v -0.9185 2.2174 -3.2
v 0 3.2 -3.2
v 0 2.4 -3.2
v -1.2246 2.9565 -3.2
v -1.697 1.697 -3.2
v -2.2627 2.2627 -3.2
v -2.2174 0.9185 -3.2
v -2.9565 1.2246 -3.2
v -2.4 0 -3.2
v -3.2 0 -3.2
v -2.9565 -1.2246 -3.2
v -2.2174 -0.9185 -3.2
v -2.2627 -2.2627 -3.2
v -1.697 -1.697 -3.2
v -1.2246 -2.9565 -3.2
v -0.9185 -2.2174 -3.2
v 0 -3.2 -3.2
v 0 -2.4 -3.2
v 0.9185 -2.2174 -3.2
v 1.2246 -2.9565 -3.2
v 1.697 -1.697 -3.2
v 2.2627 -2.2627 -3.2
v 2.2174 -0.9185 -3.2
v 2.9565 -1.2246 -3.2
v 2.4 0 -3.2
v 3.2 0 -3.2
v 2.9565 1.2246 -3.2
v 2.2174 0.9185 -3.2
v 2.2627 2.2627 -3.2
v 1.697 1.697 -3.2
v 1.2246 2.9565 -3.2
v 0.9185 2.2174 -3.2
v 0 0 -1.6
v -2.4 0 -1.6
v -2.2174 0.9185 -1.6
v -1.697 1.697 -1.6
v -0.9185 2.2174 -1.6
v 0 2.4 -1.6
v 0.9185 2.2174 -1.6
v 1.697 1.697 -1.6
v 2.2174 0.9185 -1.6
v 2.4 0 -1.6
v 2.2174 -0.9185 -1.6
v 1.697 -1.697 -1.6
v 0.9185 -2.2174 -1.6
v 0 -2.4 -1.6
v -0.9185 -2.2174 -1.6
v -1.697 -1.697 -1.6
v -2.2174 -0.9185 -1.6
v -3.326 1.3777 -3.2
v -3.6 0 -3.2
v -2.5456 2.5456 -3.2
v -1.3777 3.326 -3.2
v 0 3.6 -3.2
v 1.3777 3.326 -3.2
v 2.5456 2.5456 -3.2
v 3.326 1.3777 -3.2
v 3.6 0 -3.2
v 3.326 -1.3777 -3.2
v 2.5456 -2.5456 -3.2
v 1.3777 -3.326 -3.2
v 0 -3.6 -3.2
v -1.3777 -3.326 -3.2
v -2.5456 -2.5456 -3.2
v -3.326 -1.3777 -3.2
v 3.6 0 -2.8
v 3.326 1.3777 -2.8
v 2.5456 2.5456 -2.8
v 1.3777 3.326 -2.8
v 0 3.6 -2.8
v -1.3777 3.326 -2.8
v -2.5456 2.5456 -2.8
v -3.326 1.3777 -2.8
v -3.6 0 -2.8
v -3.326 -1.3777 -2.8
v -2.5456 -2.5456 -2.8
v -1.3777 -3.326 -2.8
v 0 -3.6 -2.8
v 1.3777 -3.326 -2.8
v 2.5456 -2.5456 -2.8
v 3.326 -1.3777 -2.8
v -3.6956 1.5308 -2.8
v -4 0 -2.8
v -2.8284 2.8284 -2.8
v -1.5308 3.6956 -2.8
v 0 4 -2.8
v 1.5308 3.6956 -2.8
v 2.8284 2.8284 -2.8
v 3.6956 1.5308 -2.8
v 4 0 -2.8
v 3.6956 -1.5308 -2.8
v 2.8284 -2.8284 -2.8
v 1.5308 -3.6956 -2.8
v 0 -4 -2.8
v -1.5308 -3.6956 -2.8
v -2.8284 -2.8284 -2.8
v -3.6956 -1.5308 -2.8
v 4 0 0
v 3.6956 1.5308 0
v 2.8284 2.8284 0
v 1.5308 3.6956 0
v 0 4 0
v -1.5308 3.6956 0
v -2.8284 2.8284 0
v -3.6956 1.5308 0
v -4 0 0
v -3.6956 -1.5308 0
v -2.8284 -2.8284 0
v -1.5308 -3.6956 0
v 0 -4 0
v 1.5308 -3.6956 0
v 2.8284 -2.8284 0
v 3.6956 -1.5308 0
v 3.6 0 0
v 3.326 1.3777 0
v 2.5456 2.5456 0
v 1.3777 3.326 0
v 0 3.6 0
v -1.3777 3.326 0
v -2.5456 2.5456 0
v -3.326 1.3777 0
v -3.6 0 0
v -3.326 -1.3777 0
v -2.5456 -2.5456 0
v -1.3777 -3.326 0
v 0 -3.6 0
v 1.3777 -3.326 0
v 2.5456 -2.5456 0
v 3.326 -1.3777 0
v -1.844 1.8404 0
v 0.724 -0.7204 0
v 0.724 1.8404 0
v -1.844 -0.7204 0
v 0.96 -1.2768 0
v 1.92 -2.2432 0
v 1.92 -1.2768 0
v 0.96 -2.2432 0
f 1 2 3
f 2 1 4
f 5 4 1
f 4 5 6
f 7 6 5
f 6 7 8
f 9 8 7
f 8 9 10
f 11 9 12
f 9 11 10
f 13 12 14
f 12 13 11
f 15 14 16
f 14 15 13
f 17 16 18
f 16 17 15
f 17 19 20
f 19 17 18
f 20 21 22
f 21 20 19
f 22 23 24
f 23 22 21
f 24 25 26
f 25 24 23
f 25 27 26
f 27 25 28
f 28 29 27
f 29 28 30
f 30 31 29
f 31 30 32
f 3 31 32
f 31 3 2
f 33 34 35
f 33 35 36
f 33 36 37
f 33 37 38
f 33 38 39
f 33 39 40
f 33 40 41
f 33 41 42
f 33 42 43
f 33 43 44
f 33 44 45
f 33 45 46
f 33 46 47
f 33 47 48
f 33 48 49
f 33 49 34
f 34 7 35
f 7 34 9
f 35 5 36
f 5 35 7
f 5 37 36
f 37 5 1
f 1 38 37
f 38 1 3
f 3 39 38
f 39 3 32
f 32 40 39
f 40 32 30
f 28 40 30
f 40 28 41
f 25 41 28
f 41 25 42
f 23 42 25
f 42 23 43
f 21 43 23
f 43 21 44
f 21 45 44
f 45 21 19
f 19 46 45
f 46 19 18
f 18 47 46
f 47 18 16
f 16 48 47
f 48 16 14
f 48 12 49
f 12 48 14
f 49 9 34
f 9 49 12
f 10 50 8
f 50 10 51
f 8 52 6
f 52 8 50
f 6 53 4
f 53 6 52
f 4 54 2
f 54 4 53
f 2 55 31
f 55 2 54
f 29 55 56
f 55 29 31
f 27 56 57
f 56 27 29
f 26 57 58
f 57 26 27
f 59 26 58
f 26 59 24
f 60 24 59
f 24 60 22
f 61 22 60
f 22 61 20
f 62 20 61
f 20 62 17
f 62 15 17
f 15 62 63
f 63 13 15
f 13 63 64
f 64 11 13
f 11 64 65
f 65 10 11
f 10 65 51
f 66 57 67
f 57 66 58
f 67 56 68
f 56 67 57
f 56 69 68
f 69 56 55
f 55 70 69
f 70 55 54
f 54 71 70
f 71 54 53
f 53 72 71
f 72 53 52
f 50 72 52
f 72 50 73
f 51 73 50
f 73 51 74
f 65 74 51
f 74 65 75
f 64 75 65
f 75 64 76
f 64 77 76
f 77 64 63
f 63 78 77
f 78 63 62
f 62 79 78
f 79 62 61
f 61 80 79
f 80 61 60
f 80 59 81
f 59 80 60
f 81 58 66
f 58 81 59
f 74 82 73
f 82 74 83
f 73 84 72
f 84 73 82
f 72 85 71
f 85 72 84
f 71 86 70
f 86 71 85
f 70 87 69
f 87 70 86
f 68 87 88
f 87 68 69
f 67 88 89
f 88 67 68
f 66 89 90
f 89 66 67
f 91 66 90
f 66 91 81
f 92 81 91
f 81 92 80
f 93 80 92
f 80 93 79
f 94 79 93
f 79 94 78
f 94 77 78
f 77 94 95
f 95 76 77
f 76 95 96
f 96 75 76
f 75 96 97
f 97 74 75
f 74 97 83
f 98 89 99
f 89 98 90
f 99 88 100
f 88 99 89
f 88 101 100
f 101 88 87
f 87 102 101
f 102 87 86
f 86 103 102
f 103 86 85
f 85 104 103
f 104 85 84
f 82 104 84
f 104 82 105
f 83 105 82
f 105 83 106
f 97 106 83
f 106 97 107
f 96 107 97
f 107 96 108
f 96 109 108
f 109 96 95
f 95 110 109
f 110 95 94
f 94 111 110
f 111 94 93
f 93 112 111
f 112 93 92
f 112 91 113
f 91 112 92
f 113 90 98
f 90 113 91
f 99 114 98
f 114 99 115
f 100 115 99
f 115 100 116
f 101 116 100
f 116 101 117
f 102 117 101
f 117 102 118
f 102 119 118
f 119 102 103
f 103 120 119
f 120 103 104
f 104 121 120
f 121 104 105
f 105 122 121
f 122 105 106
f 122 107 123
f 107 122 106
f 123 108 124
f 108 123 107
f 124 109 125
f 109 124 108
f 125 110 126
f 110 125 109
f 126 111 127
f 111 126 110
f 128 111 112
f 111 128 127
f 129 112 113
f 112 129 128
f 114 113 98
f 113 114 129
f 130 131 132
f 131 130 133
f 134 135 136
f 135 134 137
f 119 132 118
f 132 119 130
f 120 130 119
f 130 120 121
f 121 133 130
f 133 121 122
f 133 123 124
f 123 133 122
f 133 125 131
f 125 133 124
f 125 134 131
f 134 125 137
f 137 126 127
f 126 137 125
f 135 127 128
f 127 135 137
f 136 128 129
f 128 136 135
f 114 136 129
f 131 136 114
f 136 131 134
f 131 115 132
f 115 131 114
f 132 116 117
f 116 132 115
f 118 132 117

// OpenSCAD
// file: ../p/4-4disc.scad
use <../lib.scad>
function ldraw_lib__4_4disc() = [
// 0 Disc 1.0
// 0 Name: 4-4disc.dat
// 0 Author: James Jessiman
// 0 !LDRAW_ORG Primitive UPDATE 2002-02
// 0 !LICENSE Licensed under CC BY 2.0 and CC BY 4.0 : see CAreadme.txt
// 
// 0 BFC CERTIFY CCW
  [0,"BFC","CERTIFY"],
  [0,"BFC","CCW"],
// 
// 0 !HISTORY 1998-12-15 [PTadmin] Official Update 1998-10
// 0 !HISTORY 2002-03-23 [sbliss] Added BFC statement
// 0 !HISTORY 2002-04-25 [PTadmin] Official Update 2002-02
// 0 !HISTORY 2007-06-24 [PTadmin] Header formatted for Contributor Agreement
// 0 !HISTORY 2008-07-01 [PTadmin] Official Update 2008-01
// 
// 
// 3 16 0 0 0 1 0 0 0.9239 0 0.3827
  [3,16,0,0,0,1,0,0,0.9239,0,0.3827],
// 3 16 0 0 0 0.9239 0 0.3827 0.7071 0 0.7071
  [3,16,0,0,0,0.9239,0,0.3827,0.7071,0,0.7071],
// 3 16 0 0 0 0.7071 0 0.7071 0.3827 0 0.9239
  [3,16,0,0,0,0.7071,0,0.7071,0.3827,0,0.9239],
// 3 16 0 0 0 0.3827 0 0.9239 0 0 1
  [3,16,0,0,0,0.3827,0,0.9239,0,0,1],
// 3 16 0 0 0 0 0 1 -0.3827 0 0.9239
  [3,16,0,0,0,0,0,1,-0.3827,0,0.9239],
// 3 16 0 0 0 -0.3827 0 0.9239 -0.7071 0 0.7071
  [3,16,0,0,0,-0.3827,0,0.9239,-0.7071,0,0.7071],
// 3 16 0 0 0 -0.7071 0 0.7071 -0.9239 0 0.3827
  [3,16,0,0,0,-0.7071,0,0.7071,-0.9239,0,0.3827],
// 3 16 0 0 0 -0.9239 0 0.3827 -1 0 -0
  [3,16,0,0,0,-0.9239,0,0.3827,-1,0,-0],
// 3 16 0 0 0 -1 0 -0 -0.9239 0 -0.3827
  [3,16,0,0,0,-1,0,-0,-0.9239,0,-0.3827],
// 3 16 0 0 0 -0.9239 0 -0.3827 -0.7071 0 -0.7071
  [3,16,0,0,0,-0.9239,0,-0.3827,-0.7071,0,-0.7071],
// 3 16 0 0 0 -0.7071 0 -0.7071 -0.3827 0 -0.9239
  [3,16,0,0,0,-0.7071,0,-0.7071,-0.3827,0,-0.9239],
// 3 16 0 0 0 -0.3827 0 -0.9239 0 0 -1
  [3,16,0,0,0,-0.3827,0,-0.9239,0,0,-1],
// 3 16 0 0 0 0 0 -1 0.3827 0 -0.9239
  [3,16,0,0,0,0,0,-1,0.3827,0,-0.9239],
// 3 16 0 0 0 0.3827 0 -0.9239 0.7071 0 -0.7071
  [3,16,0,0,0,0.3827,0,-0.9239,0.7071,0,-0.7071],
// 3 16 0 0 0 0.7071 0 -0.7071 0.9239 0 -0.3827
  [3,16,0,0,0,0.7071,0,-0.7071,0.9239,0,-0.3827],
// 3 16 0 0 0 0.9239 0 -0.3827 1 0 0
  [3,16,0,0,0,0.9239,0,-0.3827,1,0,0],
// 0
];
makepoly(ldraw_lib__4_4disc(), line=0.2);
// file: ../p/4-4ring3.scad
use <../lib.scad>
function ldraw_lib__4_4ring3() = [
// 0 Ring  3 x 1.0
// 0 Name: 4-4ring3.dat
// 0 Author: James Jessiman
// 0 !LDRAW_ORG Primitive UPDATE 2009-01
// 0 !LICENSE Licensed under CC BY 2.0 and CC BY 4.0 : see CAreadme.txt
// 
// 0 BFC CERTIFY CCW
  [0,"BFC","CERTIFY"],
  [0,"BFC","CCW"],
// 
// 0 !HISTORY 1998-12-15 [PTadmin] Official Update 1998-10
// 0 !HISTORY 2002-04-05 [hafhead] Added BFC statement
// 0 !HISTORY 2002-04-25 [PTadmin] Official Update 2002-02
// 0 !HISTORY 2007-06-24 [PTadmin] Header formatted for Contributor Agreement
// 0 !HISTORY 2008-07-01 [PTadmin] Official Update 2008-01
// 0 !HISTORY 2008-08-26 [cwdee] Switch polygon winding and rename
// 0 !HISTORY 2009-05-02 [PTadmin] Official Update 2009-01
// 
// 
// 4 16 -1.5308 0 3.6956 -1.1481 0 2.7717 0 0 3 0 0 4
  [4,16,-1.5308,0,3.6956,-1.1481,0,2.7717,0,0,3,0,0,4],
// 4 16 -2.8284 0 2.8284 -2.1213 0 2.1213 -1.1481 0 2.7717 -1.5308 0 3.6956
  [4,16,-2.8284,0,2.8284,-2.1213,0,2.1213,-1.1481,0,2.7717,-1.5308,0,3.6956],
// 4 16 -3.6956 0 1.5308 -2.7717 0 1.1481 -2.1213 0 2.1213 -2.8284 0 2.8284
  [4,16,-3.6956,0,1.5308,-2.7717,0,1.1481,-2.1213,0,2.1213,-2.8284,0,2.8284],
// 4 16 -4 0 0 -3 0 0 -2.7717 0 1.1481 -3.6956 0 1.5308
  [4,16,-4,0,0,-3,0,0,-2.7717,0,1.1481,-3.6956,0,1.5308],
// 4 16 -3.6956 0 -1.5308 -2.7717 0 -1.1481 -3 0 0 -4 0 0
  [4,16,-3.6956,0,-1.5308,-2.7717,0,-1.1481,-3,0,0,-4,0,0],
// 4 16 -2.8284 0 -2.8284 -2.1213 0 -2.1213 -2.7717 0 -1.1481 -3.6956 0 -1.5308
  [4,16,-2.8284,0,-2.8284,-2.1213,0,-2.1213,-2.7717,0,-1.1481,-3.6956,0,-1.5308],
// 4 16 -1.5308 0 -3.6956 -1.1481 0 -2.7717 -2.1213 0 -2.1213 -2.8284 0 -2.8284
  [4,16,-1.5308,0,-3.6956,-1.1481,0,-2.7717,-2.1213,0,-2.1213,-2.8284,0,-2.8284],
// 4 16 0 0 -4 0 0 -3 -1.1481 0 -2.7717 -1.5308 0 -3.6956
  [4,16,0,0,-4,0,0,-3,-1.1481,0,-2.7717,-1.5308,0,-3.6956],
// 4 16 1.5308 0 -3.6956 1.1481 0 -2.7717 0 0 -3 0 0 -4
  [4,16,1.5308,0,-3.6956,1.1481,0,-2.7717,0,0,-3,0,0,-4],
// 4 16 2.8284 0 -2.8284 2.1213 0 -2.1213 1.1481 0 -2.7717 1.5308 0 -3.6956
  [4,16,2.8284,0,-2.8284,2.1213,0,-2.1213,1.1481,0,-2.7717,1.5308,0,-3.6956],
// 4 16 3.6956 0 -1.5308 2.7717 0 -1.1481 2.1213 0 -2.1213 2.8284 0 -2.8284
  [4,16,3.6956,0,-1.5308,2.7717,0,-1.1481,2.1213,0,-2.1213,2.8284,0,-2.8284],
// 4 16 4 0 0 3 0 0 2.7717 0 -1.1481 3.6956 0 -1.5308
  [4,16,4,0,0,3,0,0,2.7717,0,-1.1481,3.6956,0,-1.5308],
// 4 16 3.6956 0 1.5308 2.7717 0 1.1481 3 0 0 4 0 0
  [4,16,3.6956,0,1.5308,2.7717,0,1.1481,3,0,0,4,0,0],
// 4 16 2.8284 0 2.8284 2.1213 0 2.1213 2.7717 0 1.1481 3.6956 0 1.5308
  [4,16,2.8284,0,2.8284,2.1213,0,2.1213,2.7717,0,1.1481,3.6956,0,1.5308],
// 4 16 1.5308 0 3.6956 1.1481 0 2.7717 2.1213 0 2.1213 2.8284 0 2.8284
  [4,16,1.5308,0,3.6956,1.1481,0,2.7717,2.1213,0,2.1213,2.8284,0,2.8284],
// 4 16 0 0 4 0 0 3 1.1481 0 2.7717 1.5308 0 3.6956
  [4,16,0,0,4,0,0,3,1.1481,0,2.7717,1.5308,0,3.6956],
// 0
];
makepoly(ldraw_lib__4_4ring3(), line=0.2);
// file: ../p/4-4cylc.scad
use <../lib.scad>
use <4-4cyli.scad>
use <4-4disc.scad>
use <4-4edge.scad>
function ldraw_lib__4_4cylc() = [
// 0 Cylinder Closed 1.0
// 0 Name: 4-4cylc.dat
// 0 Author: Alex Taylor [anathema]
// 0 !LDRAW_ORG Primitive UPDATE 2009-02
// 0 !LICENSE Licensed under CC BY 2.0 and CC BY 4.0 : see CAreadme.txt
// 
// 0 BFC CERTIFY CCW
  [0,"BFC","CERTIFY"],
  [0,"BFC","CCW"],
// 
// 0 !HISTORY 2008-12-29 [cwdee] Removed one disc
// 0 !HISTORY 2009-09-03 [PTadmin] Official Update 2009-02
// 
// 
// 1 16 0 0 0 1 0 0 0 1 0 0 0 1 4-4edge.dat
  [1,16,0,0,0,1,0,0,0,1,0,0,0,1, ldraw_lib__4_4edge()],
// 1 16 0 1 0 1 0 0 0 1 0 0 0 1 4-4edge.dat
  [1,16,0,1,0,1,0,0,0,1,0,0,0,1, ldraw_lib__4_4edge()],
// 1 16 0 0 0 1 0 0 0 1 0 0 0 1 4-4disc.dat
  [1,16,0,0,0,1,0,0,0,1,0,0,0,1, ldraw_lib__4_4disc()],
// 1 16 0 0 0 1 0 0 0 1 0 0 0 1 4-4cyli.dat
  [1,16,0,0,0,1,0,0,0,1,0,0,0,1, ldraw_lib__4_4cyli()],
// 0
];
makepoly(ldraw_lib__4_4cylc(), line=0.2);
// file: ../p/4-4edge.scad
use <../lib.scad>
function ldraw_lib__4_4edge() = [
// 0 Circle 1.0
// 0 Name: 4-4edge.dat
// 0 Author: James Jessiman
// 0 !LDRAW_ORG Primitive UPDATE 2017-01
// 0 !LICENSE Licensed under CC BY 2.0 and CC BY 4.0 : see CAreadme.txt
// 
// 0 BFC CERTIFY CCW
  [0,"BFC","CERTIFY"],
  [0,"BFC","CCW"],
// 
// 0 !HISTORY 1998-12-15 [PTadmin] Official Update 1998-10
// 0 !HISTORY 2005-12-28 [PTadmin] Official Update 2005-01
// 0 !HISTORY 2007-06-24 [PTadmin] Header formatted for Contributor Agreement
// 0 !HISTORY 2008-07-01 [PTadmin] Official Update 2008-01
// 0 !HISTORY 2017-01-15 [Steffen] BFCed
// 0 !HISTORY 2017-12-30 [PTadmin] Official Update 2017-01
// 
// 
// 2 24 1 0 0 0.9239 0 0.3827
  [2,24,1,0,0,0.9239,0,0.3827],
// 2 24 0.9239 0 0.3827 0.7071 0 0.7071
  [2,24,0.9239,0,0.3827,0.7071,0,0.7071],
// 2 24 0.7071 0 0.7071 0.3827 0 0.9239
  [2,24,0.7071,0,0.7071,0.3827,0,0.9239],
// 2 24 0.3827 0 0.9239 0 0 1
  [2,24,0.3827,0,0.9239,0,0,1],
// 2 24 0 0 1 -0.3827 0 0.9239
  [2,24,0,0,1,-0.3827,0,0.9239],
// 2 24 -0.3827 0 0.9239 -0.7071 0 0.7071
  [2,24,-0.3827,0,0.9239,-0.7071,0,0.7071],
// 2 24 -0.7071 0 0.7071 -0.9239 0 0.3827
  [2,24,-0.7071,0,0.7071,-0.9239,0,0.3827],
// 2 24 -0.9239 0 0.3827 -1 0 -0
  [2,24,-0.9239,0,0.3827,-1,0,-0],
// 2 24 -1 0 -0 -0.9239 0 -0.3827
  [2,24,-1,0,-0,-0.9239,0,-0.3827],
// 2 24 -0.9239 0 -0.3827 -0.7071 0 -0.7071
  [2,24,-0.9239,0,-0.3827,-0.7071,0,-0.7071],
// 2 24 -0.7071 0 -0.7071 -0.3827 0 -0.9239
  [2,24,-0.7071,0,-0.7071,-0.3827,0,-0.9239],
// 2 24 -0.3827 0 -0.9239 0 0 -1
  [2,24,-0.3827,0,-0.9239,0,0,-1],
// 2 24 0 0 -1 0.3827 0 -0.9239
  [2,24,0,0,-1,0.3827,0,-0.9239],
// 2 24 0.3827 0 -0.9239 0.7071 0 -0.7071
  [2,24,0.3827,0,-0.9239,0.7071,0,-0.7071],
// 2 24 0.7071 0 -0.7071 0.9239 0 -0.3827
  [2,24,0.7071,0,-0.7071,0.9239,0,-0.3827],
// 2 24 0.9239 0 -0.3827 1 0 0
  [2,24,0.9239,0,-0.3827,1,0,0],
];
makepoly(ldraw_lib__4_4edge(), line=0.2);
// file: ../p/4-4cyli.scad
use <../lib.scad>
function ldraw_lib__4_4cyli() = [
// 0 Cylinder 1.0
// 0 Name: 4-4cyli.dat
// 0 Author: James Jessiman
// 0 !LDRAW_ORG Primitive UPDATE 2005-01
// 0 !LICENSE Licensed under CC BY 2.0 and CC BY 4.0 : see CAreadme.txt
// 
// 0 BFC CERTIFY CCW
  [0,"BFC","CERTIFY"],
  [0,"BFC","CCW"],
// 
// 0 !HISTORY 1998-12-15 [PTadmin] Official Update 1998-10
// 0 !HISTORY 2002-03-23 [sbliss] Added BFC statement; merged headers from files in distributions LDraw 0.27 and Complete.
// 0 !HISTORY 2002-04-25 [PTadmin] Official Update 2002-02
// 0 !HISTORY 2004-12-14 [guyvivan] BFC CCW
// 0 !HISTORY 2005-12-28 [PTadmin] Official Update 2005-01
// 0 !HISTORY 2007-06-24 [PTadmin] Header formatted for Contributor Agreement
// 0 !HISTORY 2008-07-01 [PTadmin] Official Update 2008-01
// 
// 
// 4 16 1 1 0 0.9239 1 0.3827 0.9239 0 0.3827 1 0 0
  [4,16,1,1,0,0.9239,1,0.3827,0.9239,0,0.3827,1,0,0],
// 5 24 1 0 0 1 1 0 0.9239 0 0.3827 0.9239 0 -0.3827
  [5,24,1,0,0,1,1,0,0.9239,0,0.3827,0.9239,0,-0.3827],
// 4 16 0.9239 1 0.3827 0.7071 1 0.7071 0.7071 0 0.7071 0.9239 0 0.3827
  [4,16,0.9239,1,0.3827,0.7071,1,0.7071,0.7071,0,0.7071,0.9239,0,0.3827],
// 5 24 0.9239 0 0.3827 0.9239 1 0.3827 0.7071 0 0.7071 1 0 0
  [5,24,0.9239,0,0.3827,0.9239,1,0.3827,0.7071,0,0.7071,1,0,0],
// 4 16 0.7071 1 0.7071 0.3827 1 0.9239 0.3827 0 0.9239 0.7071 0 0.7071
  [4,16,0.7071,1,0.7071,0.3827,1,0.9239,0.3827,0,0.9239,0.7071,0,0.7071],
// 5 24 0.7071 0 0.7071 0.7071 1 0.7071 0.3827 0 0.9239 0.9239 0 0.3827
  [5,24,0.7071,0,0.7071,0.7071,1,0.7071,0.3827,0,0.9239,0.9239,0,0.3827],
// 4 16 0.3827 1 0.9239 0 1 1 0 0 1 0.3827 0 0.9239
  [4,16,0.3827,1,0.9239,0,1,1,0,0,1,0.3827,0,0.9239],
// 5 24 0.3827 0 0.9239 0.3827 1 0.9239 0 0 1 0.7071 0 0.7071
  [5,24,0.3827,0,0.9239,0.3827,1,0.9239,0,0,1,0.7071,0,0.7071],
// 4 16 0 1 1 -0.3827 1 0.9239 -0.3827 0 0.9239 0 0 1
  [4,16,0,1,1,-0.3827,1,0.9239,-0.3827,0,0.9239,0,0,1],
// 5 24 0 0 1 0 1 1 -0.3827 0 0.9239 0.3827 0 0.9239
  [5,24,0,0,1,0,1,1,-0.3827,0,0.9239,0.3827,0,0.9239],
// 4 16 -0.3827 1 0.9239 -0.7071 1 0.7071 -0.7071 0 0.7071 -0.3827 0 0.9239
  [4,16,-0.3827,1,0.9239,-0.7071,1,0.7071,-0.7071,0,0.7071,-0.3827,0,0.9239],
// 5 24 -0.3827 0 0.9239 -0.3827 1 0.9239 -0.7071 0 0.7071 0 0 1
  [5,24,-0.3827,0,0.9239,-0.3827,1,0.9239,-0.7071,0,0.7071,0,0,1],
// 4 16 -0.7071 1 0.7071 -0.9239 1 0.3827 -0.9239 0 0.3827 -0.7071 0 0.7071
  [4,16,-0.7071,1,0.7071,-0.9239,1,0.3827,-0.9239,0,0.3827,-0.7071,0,0.7071],
// 5 24 -0.7071 0 0.7071 -0.7071 1 0.7071 -0.9239 0 0.3827 -0.3827 0 0.9239
  [5,24,-0.7071,0,0.7071,-0.7071,1,0.7071,-0.9239,0,0.3827,-0.3827,0,0.9239],
// 4 16 -0.9239 1 0.3827 -1 1 0 -1 0 0 -0.9239 0 0.3827
  [4,16,-0.9239,1,0.3827,-1,1,0,-1,0,0,-0.9239,0,0.3827],
// 5 24 -0.9239 0 0.3827 -0.9239 1 0.3827 -1 0 0 -0.7071 0 0.7071
  [5,24,-0.9239,0,0.3827,-0.9239,1,0.3827,-1,0,0,-0.7071,0,0.7071],
// 4 16 -1 1 0 -0.9239 1 -0.3827 -0.9239 0 -0.3827 -1 0 0
  [4,16,-1,1,0,-0.9239,1,-0.3827,-0.9239,0,-0.3827,-1,0,0],
// 5 24 -1 0 0 -1 1 0 -0.9239 0 -0.3827 -0.9239 0 0.3827
  [5,24,-1,0,0,-1,1,0,-0.9239,0,-0.3827,-0.9239,0,0.3827],
// 4 16 -0.9239 1 -0.3827 -0.7071 1 -0.7071 -0.7071 0 -0.7071 -0.9239 0 -0.3827
  [4,16,-0.9239,1,-0.3827,-0.7071,1,-0.7071,-0.7071,0,-0.7071,-0.9239,0,-0.3827],
// 5 24 -0.9239 0 -0.3827 -0.9239 1 -0.3827 -0.7071 0 -0.7071 -1 0 0
  [5,24,-0.9239,0,-0.3827,-0.9239,1,-0.3827,-0.7071,0,-0.7071,-1,0,0],
// 4 16 -0.7071 1 -0.7071 -0.3827 1 -0.9239 -0.3827 0 -0.9239 -0.7071 0 -0.7071
  [4,16,-0.7071,1,-0.7071,-0.3827,1,-0.9239,-0.3827,0,-0.9239,-0.7071,0,-0.7071],
// 5 24 -0.7071 0 -0.7071 -0.7071 1 -0.7071 -0.3827 0 -0.9239 -0.9239 0 -0.3827
  [5,24,-0.7071,0,-0.7071,-0.7071,1,-0.7071,-0.3827,0,-0.9239,-0.9239,0,-0.3827],
// 4 16 -0.3827 1 -0.9239 0 1 -1 0 0 -1 -0.3827 0 -0.9239
  [4,16,-0.3827,1,-0.9239,0,1,-1,0,0,-1,-0.3827,0,-0.9239],
// 5 24 -0.3827 0 -0.9239 -0.3827 1 -0.9239 0 0 -1 -0.7071 0 -0.7071
  [5,24,-0.3827,0,-0.9239,-0.3827,1,-0.9239,0,0,-1,-0.7071,0,-0.7071],
// 4 16 0 1 -1 0.3827 1 -0.9239 0.3827 0 -0.9239 0 0 -1
  [4,16,0,1,-1,0.3827,1,-0.9239,0.3827,0,-0.9239,0,0,-1],
// 5 24 0 0 -1 0 1 -1 0.3827 0 -0.9239 -0.3827 0 -0.9239
  [5,24,0,0,-1,0,1,-1,0.3827,0,-0.9239,-0.3827,0,-0.9239],
// 4 16 0.3827 1 -0.9239 0.7071 1 -0.7071 0.7071 0 -0.7071 0.3827 0 -0.9239
  [4,16,0.3827,1,-0.9239,0.7071,1,-0.7071,0.7071,0,-0.7071,0.3827,0,-0.9239],
// 5 24 0.3827 0 -0.9239 0.3827 1 -0.9239 0.7071 0 -0.7071 0 0 -1
  [5,24,0.3827,0,-0.9239,0.3827,1,-0.9239,0.7071,0,-0.7071,0,0,-1],
// 4 16 0.7071 1 -0.7071 0.9239 1 -0.3827 0.9239 0 -0.3827 0.7071 0 -0.7071
  [4,16,0.7071,1,-0.7071,0.9239,1,-0.3827,0.9239,0,-0.3827,0.7071,0,-0.7071],
// 5 24 0.7071 0 -0.7071 0.7071 1 -0.7071 0.9239 0 -0.3827 0.3827 0 -0.9239
  [5,24,0.7071,0,-0.7071,0.7071,1,-0.7071,0.9239,0,-0.3827,0.3827,0,-0.9239],
// 4 16 0.9239 1 -0.3827 1 1 0 1 0 0 0.9239 0 -0.3827
  [4,16,0.9239,1,-0.3827,1,1,0,1,0,0,0.9239,0,-0.3827],
// 5 24 0.9239 0 -0.3827 0.9239 1 -0.3827 1 0 0 0.7071 0 -0.7071
  [5,24,0.9239,0,-0.3827,0.9239,1,-0.3827,1,0,0,0.7071,0,-0.7071],
// 0
];
makepoly(ldraw_lib__4_4cyli(), line=0.2);
// file: ../p/stud4o.scad
use <../lib.scad>
use <4-4cylc.scad>
use <4-4ring3.scad>
function ldraw_lib__stud4o() = [
// 0 Stud Tube Open without Outer Cylinder
// 0 Name: stud4o.dat
// 0 Author: Magnus Forsberg [MagFors]
// 0 !LDRAW_ORG Primitive UPDATE 2011-02
// 0 !LICENSE Licensed under CC BY 2.0 and CC BY 4.0 : see CAreadme.txt
// 
// 0 !HELP This stud is a "antistud" to be used like a underside stud,
// 0 !HELP but without the outer cylinder.
// 0 !HELP 1 47 0 0 0 1 0 0 0 1 0 0 0 1 stud4.dat
// 
// 0 BFC CERTIFY CCW
  [0,"BFC","CERTIFY"],
  [0,"BFC","CCW"],
// 
// 0 !HISTORY 2011-12-29 [PTadmin] Official Update 2011-02
// 
// 
// 1 16 0 -4 0 2 0 0 0 1 0 0 0 2 4-4ring3.dat
  [1,16,0,-4,0,2,0,0,0,1,0,0,0,2, ldraw_lib__4_4ring3()],
// 0 BFC INVERTNEXT
  [0,"BFC","INVERTNEXT"],
// 1 16 0 0 0 -6 0 0 0 -4 0 0 0 6 4-4cylc.dat
  [1,16,0,0,0,-6,0,0,0,-4,0,0,0,6, ldraw_lib__4_4cylc()],
];
makepoly(ldraw_lib__stud4o(), line=0.2);
// file: ../p/4-4ring8.scad
use <../lib.scad>
function ldraw_lib__4_4ring8() = [
// 0 Ring  8 x 1.0
// 0 Name: 4-4ring8.dat
// 0 Author: Steffen [Steffen]
// 0 !LDRAW_ORG Primitive UPDATE 2012-01
// 0 !LICENSE Licensed under CC BY 2.0 and CC BY 4.0 : see CAreadme.txt
// 
// 0 BFC CERTIFY CCW
  [0,"BFC","CERTIFY"],
  [0,"BFC","CCW"],
// 
// 0 !HISTORY 2003-12-19 [PTadmin] Official Update 2003-03
// 0 !HISTORY 2007-06-24 [PTadmin] Header formatted for Contributor Agreement
// 0 !HISTORY 2008-07-01 [PTadmin] Official Update 2008-01
// 0 !HISTORY 2012-02-16 [Philo] Changed to CCW
// 0 !HISTORY 2012-03-30 [PTadmin] Official Update 2012-01
// 
// 
// 4 16 9 0 0 8.3151 0 3.4443 7.3912 0 3.0616 8 0 0
  [4,16,9,0,0,8.3151,0,3.4443,7.3912,0,3.0616,8,0,0],
// 4 16 8.3151 0 3.4443 6.3639 0 6.3639 5.6568 0 5.6568 7.3912 0 3.0616
  [4,16,8.3151,0,3.4443,6.3639,0,6.3639,5.6568,0,5.6568,7.3912,0,3.0616],
// 4 16 6.3639 0 6.3639 3.4443 0 8.3151 3.0616 0 7.3912 5.6568 0 5.6568
  [4,16,6.3639,0,6.3639,3.4443,0,8.3151,3.0616,0,7.3912,5.6568,0,5.6568],
// 4 16 3.4443 0 8.3151 0 0 9 0 0 8 3.0616 0 7.3912
  [4,16,3.4443,0,8.3151,0,0,9,0,0,8,3.0616,0,7.3912],
// 4 16 0 0 9 -3.4443 0 8.3151 -3.0616 0 7.3912 0 0 8
  [4,16,0,0,9,-3.4443,0,8.3151,-3.0616,0,7.3912,0,0,8],
// 4 16 -3.4443 0 8.3151 -6.3639 0 6.3639 -5.6568 0 5.6568 -3.0616 0 7.3912
  [4,16,-3.4443,0,8.3151,-6.3639,0,6.3639,-5.6568,0,5.6568,-3.0616,0,7.3912],
// 4 16 -6.3639 0 6.3639 -8.3151 0 3.4443 -7.3912 0 3.0616 -5.6568 0 5.6568
  [4,16,-6.3639,0,6.3639,-8.3151,0,3.4443,-7.3912,0,3.0616,-5.6568,0,5.6568],
// 4 16 -8.3151 0 3.4443 -9 0 0 -8 0 0 -7.3912 0 3.0616
  [4,16,-8.3151,0,3.4443,-9,0,0,-8,0,0,-7.3912,0,3.0616],
// 4 16 -9 0 0 -8.3151 0 -3.4443 -7.3912 0 -3.0616 -8 0 0
  [4,16,-9,0,0,-8.3151,0,-3.4443,-7.3912,0,-3.0616,-8,0,0],
// 4 16 -8.3151 0 -3.4443 -6.3639 0 -6.3639 -5.6568 0 -5.6568 -7.3912 0 -3.0616
  [4,16,-8.3151,0,-3.4443,-6.3639,0,-6.3639,-5.6568,0,-5.6568,-7.3912,0,-3.0616],
// 4 16 -6.3639 0 -6.3639 -3.4443 0 -8.3151 -3.0616 0 -7.3912 -5.6568 0 -5.6568
  [4,16,-6.3639,0,-6.3639,-3.4443,0,-8.3151,-3.0616,0,-7.3912,-5.6568,0,-5.6568],
// 4 16 -3.4443 0 -8.3151 0 0 -9 0 0 -8 -3.0616 0 -7.3912
  [4,16,-3.4443,0,-8.3151,0,0,-9,0,0,-8,-3.0616,0,-7.3912],
// 4 16 0 0 -9 3.4443 0 -8.3151 3.0616 0 -7.3912 0 0 -8
  [4,16,0,0,-9,3.4443,0,-8.3151,3.0616,0,-7.3912,0,0,-8],
// 4 16 3.4443 0 -8.3151 6.3639 0 -6.3639 5.6568 0 -5.6568 3.0616 0 -7.3912
  [4,16,3.4443,0,-8.3151,6.3639,0,-6.3639,5.6568,0,-5.6568,3.0616,0,-7.3912],
// 4 16 6.3639 0 -6.3639 8.3151 0 -3.4443 7.3912 0 -3.0616 5.6568 0 -5.6568
  [4,16,6.3639,0,-6.3639,8.3151,0,-3.4443,7.3912,0,-3.0616,5.6568,0,-5.6568],
// 4 16 8.3151 0 -3.4443 9 0 0 8 0 0 7.3912 0 -3.0616
  [4,16,8.3151,0,-3.4443,9,0,0,8,0,0,7.3912,0,-3.0616],
];
makepoly(ldraw_lib__4_4ring8(), line=0.2);
// file: ../p/4-4cylo.scad
use <../lib.scad>
use <4-4cyli.scad>
use <4-4edge.scad>
function ldraw_lib__4_4cylo() = [
// 0 Cylinder Open 1.0
// 0 Name: 4-4cylo.dat
// 0 Author: Mark Kennedy [mkennedy]
// 0 !LDRAW_ORG Primitive UPDATE 2010-01
// 0 !LICENSE Licensed under CC BY 2.0 and CC BY 4.0 : see CAreadme.txt
// 
// 0 BFC CERTIFY CCW
  [0,"BFC","CERTIFY"],
  [0,"BFC","CCW"],
// 
// 0 !HISTORY 2010-04-05 [PTadmin] Official Update 2010-01
// 
// 
// 1 16 0 0 0 1 0 0 0 1 0 0 0 1 4-4edge.dat
  [1,16,0,0,0,1,0,0,0,1,0,0,0,1, ldraw_lib__4_4edge()],
// 1 16 0 1 0 1 0 0 0 1 0 0 0 1 4-4edge.dat
  [1,16,0,1,0,1,0,0,0,1,0,0,0,1, ldraw_lib__4_4edge()],
// 1 16 0 0 0 1 0 0 0 1 0 0 0 1 4-4cyli.dat
  [1,16,0,0,0,1,0,0,0,1,0,0,0,1, ldraw_lib__4_4cyli()],
// 0
];
makepoly(ldraw_lib__4_4cylo(), line=0.2);
// file: ../p/empty.scad
use <../lib.scad>
function ldraw_lib__empty() = [
// 0 Empty
// 0 Name: empty.dat
// 0 Author: Steffen [Steffen]
// 0 !LDRAW_ORG Primitive UPDATE 2015-01
// 0 !LICENSE Licensed under CC BY 2.0 and CC BY 4.0 : see CAreadme.txt
// 
// 0 BFC CERTIFY CCW
  [0,"BFC","CERTIFY"],
  [0,"BFC","CCW"],
// 
// 0 !HISTORY 2015-10-11 [PTadmin] Official Update 2015-01
// 
// 
// 0 // Tool MLCad cannot handle really empty files. This file is used as a workaround.
// 0 // It exceptionally contains forbidden non-LDRAW standard syntax to satisfy MLCad until it is fixed OR a different editor has become the de-facto LDRAW standard.
// 0 // The line being used here is an "impossible" conditional line which never should be visible,
// 0 // additionally hidden by a syntax explicitly hiding it from displaying.
// 
// 0 MLCAD HIDE 5 24 0 0 0 0.0001 0 0 0.0001 -0.0001 0 0 0 0
];
makepoly(ldraw_lib__empty(), line=0.2);
// file: s/98138s02.scad
use <../../lib.scad>
use <../../p/4-4cylo.scad>
use <../../p/4-4ring8.scad>
use <../../p/4-4ring9.scad>
use <../../p/stud4o.scad>
function ldraw_lib__s__98138s02() = [
// 0 ~Tile  1 x  1 Round with Groove without Complete Top Face
// 0 Name: s\98138s02.dat
// 0 Author: Magnus Forsberg [MagFors]
// 0 !LDRAW_ORG Subpart UPDATE 2020-01
// 0 !LICENSE Licensed under CC BY 2.0 and CC BY 4.0 : see CAreadme.txt
// 
// 0 BFC CERTIFY CCW
  [0,"BFC","CERTIFY"],
  [0,"BFC","CCW"],
// 
// 0 !HISTORY 2020-06-28 [PTadmin] Official Update 2020-01
// 
// 
// 1 16 0 4 0 1 0 0 0 -1 0 0 0 1 stud4o.dat
  [1,16,0,4,0,1,0,0,0,-1,0,0,0,1, ldraw_lib__stud4o()],
// 1 16 0 8 0 -1 0 0 0 -1 0 0 0 1 4-4ring8.dat
  [1,16,0,8,0,-1,0,0,0,-1,0,0,0,1, ldraw_lib__4_4ring8()],
// 1 16 0 7 0 9 0 0 0 1 0 0 0 9 4-4cylo.dat
  [1,16,0,7,0,9,0,0,0,1,0,0,0,9, ldraw_lib__4_4cylo()],
// 1 16 0 7 0 -1 0 0 0 -1 0 0 0 1 4-4ring9.dat
  [1,16,0,7,0,-1,0,0,0,-1,0,0,0,1, ldraw_lib__4_4ring9()],
// 1 16 0 0 0 10 0 0 0 7 0 0 0 10 4-4cylo.dat
  [1,16,0,0,0,10,0,0,0,7,0,0,0,10, ldraw_lib__4_4cylo()],
];
makepoly(ldraw_lib__s__98138s02(), line=0.2);
// file: ../p/4-4ring9.scad
use <../lib.scad>
function ldraw_lib__4_4ring9() = [
// 0 Ring  9 x 1.0
// 0 Name: 4-4ring9.dat
// 0 Author: John Riley [jriley]
// 0 !LDRAW_ORG Primitive UPDATE 2004-02
// 0 !LICENSE Licensed under CC BY 2.0 and CC BY 4.0 : see CAreadme.txt
// 
// 0 BFC CERTIFY CCW
  [0,"BFC","CERTIFY"],
  [0,"BFC","CCW"],
// 
// 0 !HISTORY 2004-04-22 [PTadmin] Official Update 2004-02
// 0 !HISTORY 2007-06-24 [PTadmin] Header formatted for Contributor Agreement
// 0 !HISTORY 2008-07-01 [PTadmin] Official Update 2008-01
// 
// 
// 4 16 9 0 0 10 0 0 9.239 0 3.827 8.3151 0 3.4443
  [4,16,9,0,0,10,0,0,9.239,0,3.827,8.3151,0,3.4443],
// 4 16 8.3151 0 3.4443 9.239 0 3.827 7.071 0 7.071 6.3639 0 6.3639
  [4,16,8.3151,0,3.4443,9.239,0,3.827,7.071,0,7.071,6.3639,0,6.3639],
// 4 16 6.3639 0 6.3639 7.071 0 7.071 3.827 0 9.239 3.4443 0 8.3151
  [4,16,6.3639,0,6.3639,7.071,0,7.071,3.827,0,9.239,3.4443,0,8.3151],
// 4 16 3.4443 0 8.3151 3.827 0 9.239 0 0 10 0 0 9
  [4,16,3.4443,0,8.3151,3.827,0,9.239,0,0,10,0,0,9],
// 4 16 0 0 9 0 0 10 -3.827 0 9.239 -3.4443 0 8.3151
  [4,16,0,0,9,0,0,10,-3.827,0,9.239,-3.4443,0,8.3151],
// 4 16 -3.4443 0 8.3151 -3.827 0 9.239 -7.071 0 7.071 -6.3639 0 6.3639
  [4,16,-3.4443,0,8.3151,-3.827,0,9.239,-7.071,0,7.071,-6.3639,0,6.3639],
// 4 16 -6.3639 0 6.3639 -7.071 0 7.071 -9.239 0 3.827 -8.3151 0 3.4443
  [4,16,-6.3639,0,6.3639,-7.071,0,7.071,-9.239,0,3.827,-8.3151,0,3.4443],
// 4 16 -8.3151 0 3.4443 -9.239 0 3.827 -10 0 0 -9 0 0
  [4,16,-8.3151,0,3.4443,-9.239,0,3.827,-10,0,0,-9,0,0],
// 4 16 -9 0 0 -10 0 0 -9.239 0 -3.827 -8.3151 0 -3.4443
  [4,16,-9,0,0,-10,0,0,-9.239,0,-3.827,-8.3151,0,-3.4443],
// 4 16 -8.3151 0 -3.4443 -9.239 0 -3.827 -7.071 0 -7.071 -6.3639 0 -6.3639
  [4,16,-8.3151,0,-3.4443,-9.239,0,-3.827,-7.071,0,-7.071,-6.3639,0,-6.3639],
// 4 16 -6.3639 0 -6.3639 -7.071 0 -7.071 -3.827 0 -9.239 -3.4443 0 -8.3151
  [4,16,-6.3639,0,-6.3639,-7.071,0,-7.071,-3.827,0,-9.239,-3.4443,0,-8.3151],
// 4 16 -3.4443 0 -8.3151 -3.827 0 -9.239 0 0 -10 0 0 -9
  [4,16,-3.4443,0,-8.3151,-3.827,0,-9.239,0,0,-10,0,0,-9],
// 4 16 0 0 -9 0 0 -10 3.827 0 -9.239 3.4443 0 -8.3151
  [4,16,0,0,-9,0,0,-10,3.827,0,-9.239,3.4443,0,-8.3151],
// 4 16 3.4443 0 -8.3151 3.827 0 -9.239 7.071 0 -7.071 6.3639 0 -6.3639
  [4,16,3.4443,0,-8.3151,3.827,0,-9.239,7.071,0,-7.071,6.3639,0,-6.3639],
// 4 16 6.3639 0 -6.3639 7.071 0 -7.071 9.239 0 -3.827 8.3151 0 -3.4443
  [4,16,6.3639,0,-6.3639,7.071,0,-7.071,9.239,0,-3.827,8.3151,0,-3.4443],
// 4 16 8.3151 0 -3.4443 9.239 0 -3.827 10 0 0 9 0 0
  [4,16,8.3151,0,-3.4443,9.239,0,-3.827,10,0,0,9,0,0],
// 0
];
makepoly(ldraw_lib__4_4ring9(), line=0.2);
// file: ../p/1-16chrd.scad
use <../lib.scad>
use <empty.scad>
function ldraw_lib__1_16chrd() = [
// 0 Chord 0.0625
// 0 Name: 1-16chrd.dat
// 0 Author: Philippe Hurbain [Philo]
// 0 !LDRAW_ORG Primitive UPDATE 2015-01
// 0 !LICENSE Licensed under CC BY 2.0 and CC BY 4.0 : see CAreadme.txt
// 
// 0 BFC CERTIFY CCW
  [0,"BFC","CERTIFY"],
  [0,"BFC","CCW"],
// 
// 0 !HISTORY 2015-10-11 [PTadmin] Official Update 2015-01
// 
// 
// 0 // This file is intentionally empty because at the current \P resolution,
// 0 // an 1-16chrd is actually empty. However, this file still is present
// 0 // to allow tools to do primitives substition and fill in a real chrd here,
// 0 // or, if desired, to substitute this with the hi-res 48\1-16chrd.
// 
// 0 // This file is based on an idea by Darats at http://forums.ldraw.org/read.php?19,14500,14500#msg-14500
// 
// 1 16 0 0 0 1 0 0 0 1 0 0 0 1 empty.dat
  [1,16,0,0,0,1,0,0,0,1,0,0,0,1, ldraw_lib__empty()],
];
makepoly(ldraw_lib__1_16chrd(), line=0.2);
// file: s/98138s01.scad
use <../../lib.scad>
use <../../p/4-4ring9.scad>
use <98138s02.scad>
function ldraw_lib__s__98138s01() = [
// 0 ~Tile  1 x  1 Round with Groove with Partial Top Face
// 0 Name: s\98138s01.dat
// 0 Author: Magnus Forsberg [MagFors]
// 0 !LDRAW_ORG Subpart UPDATE 2020-01
// 0 !LICENSE Licensed under CC BY 2.0 and CC BY 4.0 : see CAreadme.txt
// 
// 0 BFC CERTIFY CCW
  [0,"BFC","CERTIFY"],
  [0,"BFC","CCW"],
// 
// 0 !HISTORY 2011-12-29 [PTadmin] Official Update 2011-02
// 0 !HISTORY 2016-06-17 [MagFors] Reduced the rounded edge to 0.5 ldu
// 0 !HISTORY 2016-12-31 [PTadmin] Official Update 2016-01
// 0 !HISTORY 2019-06-17 [MagFors] Removed the rounded edge
// 0 !HISTORY 2019-07-19 [MagFors] Subfiled without top surface
// 0 !HISTORY 2020-06-28 [PTadmin] Official Update 2020-01
// 
// 
// 1 16 0 0 0 1 0 0 0 1 0 0 0 1 s\98138s02.dat
  [1,16,0,0,0,1,0,0,0,1,0,0,0,1, ldraw_lib__s__98138s02()],
// 1 16 0 0 0 1 0 0 0 1 0 0 0 1 4-4ring9.dat
  [1,16,0,0,0,1,0,0,0,1,0,0,0,1, ldraw_lib__4_4ring9()],
];
makepoly(ldraw_lib__s__98138s01(), line=0.2);
// file: ../p/4-4ering.scad
use <../lib.scad>
use <1-16chrd.scad>
function ldraw_lib__4_4ering() = [
// 0 Adapter Ring Triangles to Normal 1.0
// 0 Name: 4-4ering.dat
// 0 Author: Philippe Hurbain [Philo]
// 0 !LDRAW_ORG Primitive UPDATE 2015-01
// 0 !LICENSE Licensed under CC BY 2.0 and CC BY 4.0 : see CAreadme.txt
// 
// 0 BFC CERTIFY CCW
  [0,"BFC","CERTIFY"],
  [0,"BFC","CCW"],
// 
// 0 !HISTORY 2015-10-11 [PTadmin] Official Update 2015-01
// 
// 
// 0 // This file uses 1-16chrd (actually empty). It allows
// 0 // tools to do primitives substition and fill in a ring of chrd here,
// 0 // or, if desired, to substitute this with the hi-res 48\1-16chrd.
// 0 // This file is based on an idea by Darats at http://forums.ldraw.org/read.php?19,14500,14500#msg-14500
// 
// 1 16 0 0 0 1 0 0 0 1 0 0 0 1 1-16chrd.dat
  [1,16,0,0,0,1,0,0,0,1,0,0,0,1, ldraw_lib__1_16chrd()],
// 1 16 0 0 0 0.92388 0 0.38268 0 1 0 -0.38268 0 0.92388 1-16chrd.dat
  [1,16,0,0,0,0.92388,0,0.38268,0,1,0,-0.38268,0,0.92388, ldraw_lib__1_16chrd()],
// 1 16 0 0 0 0.70711 0 0.70711 0 1 0 -0.70711 0 0.70711 1-16chrd.dat
  [1,16,0,0,0,0.70711,0,0.70711,0,1,0,-0.70711,0,0.70711, ldraw_lib__1_16chrd()],
// 1 16 0 0 0 0.38268 0 0.92388 0 1 0 -0.92388 0 0.38268 1-16chrd.dat
  [1,16,0,0,0,0.38268,0,0.92388,0,1,0,-0.92388,0,0.38268, ldraw_lib__1_16chrd()],
// 1 16 0 0 0 0 0 1 0 1 0 -1 0 0 1-16chrd.dat
  [1,16,0,0,0,0,0,1,0,1,0,-1,0,0, ldraw_lib__1_16chrd()],
// 1 16 0 0 0 -0.38268 0 0.92388 0 1 0 -0.92388 0 -0.38268 1-16chrd.dat
  [1,16,0,0,0,-0.38268,0,0.92388,0,1,0,-0.92388,0,-0.38268, ldraw_lib__1_16chrd()],
// 1 16 0 0 0 -0.70711 0 0.70711 0 1 0 -0.70711 0 -0.70711 1-16chrd.dat
  [1,16,0,0,0,-0.70711,0,0.70711,0,1,0,-0.70711,0,-0.70711, ldraw_lib__1_16chrd()],
// 1 16 0 0 0 -0.92388 0 0.38268 0 1 0 -0.38268 0 -0.92388 1-16chrd.dat
  [1,16,0,0,0,-0.92388,0,0.38268,0,1,0,-0.38268,0,-0.92388, ldraw_lib__1_16chrd()],
// 1 16 0 0 0 0 0 -1 0 1 0 1 0 0 1-16chrd.dat
  [1,16,0,0,0,0,0,-1,0,1,0,1,0,0, ldraw_lib__1_16chrd()],
// 1 16 0 0 0 0.38268 0 -0.92388 0 1 0 0.92388 0 0.38268 1-16chrd.dat
  [1,16,0,0,0,0.38268,0,-0.92388,0,1,0,0.92388,0,0.38268, ldraw_lib__1_16chrd()],
// 1 16 0 0 0 0.70711 0 -0.70711 0 1 0 0.70711 0 0.70711 1-16chrd.dat
  [1,16,0,0,0,0.70711,0,-0.70711,0,1,0,0.70711,0,0.70711, ldraw_lib__1_16chrd()],
// 1 16 0 0 0 0.92388 0 -0.38268 0 1 0 0.38268 0 0.92388 1-16chrd.dat
  [1,16,0,0,0,0.92388,0,-0.38268,0,1,0,0.38268,0,0.92388, ldraw_lib__1_16chrd()],
// 1 16 0 0 0 -1 0 0 0 1 0 0 0 -1 1-16chrd.dat
  [1,16,0,0,0,-1,0,0,0,1,0,0,0,-1, ldraw_lib__1_16chrd()],
// 1 16 0 0 0 -0.92388 0 -0.38268 0 1 0 0.38268 0 -0.92388 1-16chrd.dat
  [1,16,0,0,0,-0.92388,0,-0.38268,0,1,0,0.38268,0,-0.92388, ldraw_lib__1_16chrd()],
// 1 16 0 0 0 -0.70711 0 -0.70711 0 1 0 0.70711 0 -0.70711 1-16chrd.dat
  [1,16,0,0,0,-0.70711,0,-0.70711,0,1,0,0.70711,0,-0.70711, ldraw_lib__1_16chrd()],
// 1 16 0 0 0 -0.38268 0 -0.92388 0 1 0 0.92388 0 -0.38268 1-16chrd.dat
  [1,16,0,0,0,-0.38268,0,-0.92388,0,1,0,0.92388,0,-0.38268, ldraw_lib__1_16chrd()],
];
makepoly(ldraw_lib__4_4ering(), line=0.2);
// main file
use <../lib.scad>
use <../p/4-4ering.scad>
use <s/98138s01.scad>
function ldraw_lib__98138pz0() = [
// 0 Tile  1 x  1 Round with Two White Squares Pattern
// 0 Name: 98138pz0.dat
// 0 Author: Merlijn Wissink [legolijntje]
// 0 !LDRAW_ORG Part UPDATE 2017-01
// 0 !LICENSE Licensed under CC BY 2.0 and CC BY 4.0 : see CAreadme.txt
// 
// 0 BFC CERTIFY CCW
  [0,"BFC","CERTIFY"],
  [0,"BFC","CCW"],
// 
// 0 !KEYWORDS Brickheadz
// 
// 0 !HISTORY 2017-12-30 [PTadmin] Official Update 2017-01
// 
// 
// 1 16 0 0 0 1 0 0 0 1 0 0 0 1 s\98138s01.dat
  [1,16,0,0,0,1,0,0,0,1,0,0,0,1, ldraw_lib__s__98138s01()],
// 1 16 0 0 0 9 0 0 0 1 0 0 0 9 4-4ering.dat
  [1,16,0,0,0,9,0,0,0,1,0,0,0,9, ldraw_lib__4_4ering()],
// 
// 4 15 -4.61 0 4.601 -4.61 0 -1.801 1.81 0 -1.801 1.81 0 4.601
  [4,15,-4.61,0,4.601,-4.61,0,-1.801,1.81,0,-1.801,1.81,0,4.601],
// 4 15 2.4 0 -3.192 2.4 0 -5.608 4.8 0 -5.608 4.8 0 -3.192
  [4,15,2.4,0,-3.192,2.4,0,-5.608,4.8,0,-5.608,4.8,0,-3.192],
// 4 16 -4.61 0 4.601 1.81 0 4.601 0 0 9 -3.4443 0 8.3151
  [4,16,-4.61,0,4.601,1.81,0,4.601,0,0,9,-3.4443,0,8.3151],
// 4 16 -4.61 0 4.601 -3.4443 0 8.3151 -6.3639 0 6.3639 -8.3151 0 3.4443
  [4,16,-4.61,0,4.601,-3.4443,0,8.3151,-6.3639,0,6.3639,-8.3151,0,3.4443],
// 4 16 -4.61 0 -1.801 -4.61 0 4.601 -8.3151 0 3.4443 -9 0 0
  [4,16,-4.61,0,-1.801,-4.61,0,4.601,-8.3151,0,3.4443,-9,0,0],
// 4 16 -4.61 0 -1.801 -9 0 0 -8.3151 0 -3.4443 -6.3639 0 -6.3639
  [4,16,-4.61,0,-1.801,-9,0,0,-8.3151,0,-3.4443,-6.3639,0,-6.3639],
// 4 16 -4.61 0 -1.801 -6.3639 0 -6.3639 -3.4443 0 -8.3151 1.81 0 -1.801
  [4,16,-4.61,0,-1.801,-6.3639,0,-6.3639,-3.4443,0,-8.3151,1.81,0,-1.801],
// 4 16 2.4 0 -3.192 1.81 0 -1.801 -3.4443 0 -8.3151 2.4 0 -5.608
  [4,16,2.4,0,-3.192,1.81,0,-1.801,-3.4443,0,-8.3151,2.4,0,-5.608],
// 4 16 2.4 0 -5.608 -3.4443 0 -8.3151 0 0 -9 3.4443 0 -8.3151
  [4,16,2.4,0,-5.608,-3.4443,0,-8.3151,0,0,-9,3.4443,0,-8.3151],
// 4 16 4.8 0 -5.608 2.4 0 -5.608 3.4443 0 -8.3151 6.3639 0 -6.3639
  [4,16,4.8,0,-5.608,2.4,0,-5.608,3.4443,0,-8.3151,6.3639,0,-6.3639],
// 4 16 4.8 0 -5.608 6.3639 0 -6.3639 8.3151 0 -3.4443 4.8 0 -3.192
  [4,16,4.8,0,-5.608,6.3639,0,-6.3639,8.3151,0,-3.4443,4.8,0,-3.192],
// 3 16 9 0 0 4.8 0 -3.192 8.3151 0 -3.4443
  [3,16,9,0,0,4.8,0,-3.192,8.3151,0,-3.4443],
// 4 16 2.4 0 -3.192 4.8 0 -3.192 9 0 0 1.81 0 -1.801
  [4,16,2.4,0,-3.192,4.8,0,-3.192,9,0,0,1.81,0,-1.801],
// 4 16 1.81 0 4.601 1.81 0 -1.801 9 0 0 8.3151 0 3.4443
  [4,16,1.81,0,4.601,1.81,0,-1.801,9,0,0,8.3151,0,3.4443],
// 4 16 1.81 0 4.601 8.3151 0 3.4443 6.3639 0 6.3639 3.4443 0 8.3151
  [4,16,1.81,0,4.601,8.3151,0,3.4443,6.3639,0,6.3639,3.4443,0,8.3151],
// 3 16 0 0 9 1.81 0 4.601 3.4443 0 8.3151
  [3,16,0,0,9,1.81,0,4.601,3.4443,0,8.3151],
];
makepoly(ldraw_lib__98138pz0(), line=0.2);
